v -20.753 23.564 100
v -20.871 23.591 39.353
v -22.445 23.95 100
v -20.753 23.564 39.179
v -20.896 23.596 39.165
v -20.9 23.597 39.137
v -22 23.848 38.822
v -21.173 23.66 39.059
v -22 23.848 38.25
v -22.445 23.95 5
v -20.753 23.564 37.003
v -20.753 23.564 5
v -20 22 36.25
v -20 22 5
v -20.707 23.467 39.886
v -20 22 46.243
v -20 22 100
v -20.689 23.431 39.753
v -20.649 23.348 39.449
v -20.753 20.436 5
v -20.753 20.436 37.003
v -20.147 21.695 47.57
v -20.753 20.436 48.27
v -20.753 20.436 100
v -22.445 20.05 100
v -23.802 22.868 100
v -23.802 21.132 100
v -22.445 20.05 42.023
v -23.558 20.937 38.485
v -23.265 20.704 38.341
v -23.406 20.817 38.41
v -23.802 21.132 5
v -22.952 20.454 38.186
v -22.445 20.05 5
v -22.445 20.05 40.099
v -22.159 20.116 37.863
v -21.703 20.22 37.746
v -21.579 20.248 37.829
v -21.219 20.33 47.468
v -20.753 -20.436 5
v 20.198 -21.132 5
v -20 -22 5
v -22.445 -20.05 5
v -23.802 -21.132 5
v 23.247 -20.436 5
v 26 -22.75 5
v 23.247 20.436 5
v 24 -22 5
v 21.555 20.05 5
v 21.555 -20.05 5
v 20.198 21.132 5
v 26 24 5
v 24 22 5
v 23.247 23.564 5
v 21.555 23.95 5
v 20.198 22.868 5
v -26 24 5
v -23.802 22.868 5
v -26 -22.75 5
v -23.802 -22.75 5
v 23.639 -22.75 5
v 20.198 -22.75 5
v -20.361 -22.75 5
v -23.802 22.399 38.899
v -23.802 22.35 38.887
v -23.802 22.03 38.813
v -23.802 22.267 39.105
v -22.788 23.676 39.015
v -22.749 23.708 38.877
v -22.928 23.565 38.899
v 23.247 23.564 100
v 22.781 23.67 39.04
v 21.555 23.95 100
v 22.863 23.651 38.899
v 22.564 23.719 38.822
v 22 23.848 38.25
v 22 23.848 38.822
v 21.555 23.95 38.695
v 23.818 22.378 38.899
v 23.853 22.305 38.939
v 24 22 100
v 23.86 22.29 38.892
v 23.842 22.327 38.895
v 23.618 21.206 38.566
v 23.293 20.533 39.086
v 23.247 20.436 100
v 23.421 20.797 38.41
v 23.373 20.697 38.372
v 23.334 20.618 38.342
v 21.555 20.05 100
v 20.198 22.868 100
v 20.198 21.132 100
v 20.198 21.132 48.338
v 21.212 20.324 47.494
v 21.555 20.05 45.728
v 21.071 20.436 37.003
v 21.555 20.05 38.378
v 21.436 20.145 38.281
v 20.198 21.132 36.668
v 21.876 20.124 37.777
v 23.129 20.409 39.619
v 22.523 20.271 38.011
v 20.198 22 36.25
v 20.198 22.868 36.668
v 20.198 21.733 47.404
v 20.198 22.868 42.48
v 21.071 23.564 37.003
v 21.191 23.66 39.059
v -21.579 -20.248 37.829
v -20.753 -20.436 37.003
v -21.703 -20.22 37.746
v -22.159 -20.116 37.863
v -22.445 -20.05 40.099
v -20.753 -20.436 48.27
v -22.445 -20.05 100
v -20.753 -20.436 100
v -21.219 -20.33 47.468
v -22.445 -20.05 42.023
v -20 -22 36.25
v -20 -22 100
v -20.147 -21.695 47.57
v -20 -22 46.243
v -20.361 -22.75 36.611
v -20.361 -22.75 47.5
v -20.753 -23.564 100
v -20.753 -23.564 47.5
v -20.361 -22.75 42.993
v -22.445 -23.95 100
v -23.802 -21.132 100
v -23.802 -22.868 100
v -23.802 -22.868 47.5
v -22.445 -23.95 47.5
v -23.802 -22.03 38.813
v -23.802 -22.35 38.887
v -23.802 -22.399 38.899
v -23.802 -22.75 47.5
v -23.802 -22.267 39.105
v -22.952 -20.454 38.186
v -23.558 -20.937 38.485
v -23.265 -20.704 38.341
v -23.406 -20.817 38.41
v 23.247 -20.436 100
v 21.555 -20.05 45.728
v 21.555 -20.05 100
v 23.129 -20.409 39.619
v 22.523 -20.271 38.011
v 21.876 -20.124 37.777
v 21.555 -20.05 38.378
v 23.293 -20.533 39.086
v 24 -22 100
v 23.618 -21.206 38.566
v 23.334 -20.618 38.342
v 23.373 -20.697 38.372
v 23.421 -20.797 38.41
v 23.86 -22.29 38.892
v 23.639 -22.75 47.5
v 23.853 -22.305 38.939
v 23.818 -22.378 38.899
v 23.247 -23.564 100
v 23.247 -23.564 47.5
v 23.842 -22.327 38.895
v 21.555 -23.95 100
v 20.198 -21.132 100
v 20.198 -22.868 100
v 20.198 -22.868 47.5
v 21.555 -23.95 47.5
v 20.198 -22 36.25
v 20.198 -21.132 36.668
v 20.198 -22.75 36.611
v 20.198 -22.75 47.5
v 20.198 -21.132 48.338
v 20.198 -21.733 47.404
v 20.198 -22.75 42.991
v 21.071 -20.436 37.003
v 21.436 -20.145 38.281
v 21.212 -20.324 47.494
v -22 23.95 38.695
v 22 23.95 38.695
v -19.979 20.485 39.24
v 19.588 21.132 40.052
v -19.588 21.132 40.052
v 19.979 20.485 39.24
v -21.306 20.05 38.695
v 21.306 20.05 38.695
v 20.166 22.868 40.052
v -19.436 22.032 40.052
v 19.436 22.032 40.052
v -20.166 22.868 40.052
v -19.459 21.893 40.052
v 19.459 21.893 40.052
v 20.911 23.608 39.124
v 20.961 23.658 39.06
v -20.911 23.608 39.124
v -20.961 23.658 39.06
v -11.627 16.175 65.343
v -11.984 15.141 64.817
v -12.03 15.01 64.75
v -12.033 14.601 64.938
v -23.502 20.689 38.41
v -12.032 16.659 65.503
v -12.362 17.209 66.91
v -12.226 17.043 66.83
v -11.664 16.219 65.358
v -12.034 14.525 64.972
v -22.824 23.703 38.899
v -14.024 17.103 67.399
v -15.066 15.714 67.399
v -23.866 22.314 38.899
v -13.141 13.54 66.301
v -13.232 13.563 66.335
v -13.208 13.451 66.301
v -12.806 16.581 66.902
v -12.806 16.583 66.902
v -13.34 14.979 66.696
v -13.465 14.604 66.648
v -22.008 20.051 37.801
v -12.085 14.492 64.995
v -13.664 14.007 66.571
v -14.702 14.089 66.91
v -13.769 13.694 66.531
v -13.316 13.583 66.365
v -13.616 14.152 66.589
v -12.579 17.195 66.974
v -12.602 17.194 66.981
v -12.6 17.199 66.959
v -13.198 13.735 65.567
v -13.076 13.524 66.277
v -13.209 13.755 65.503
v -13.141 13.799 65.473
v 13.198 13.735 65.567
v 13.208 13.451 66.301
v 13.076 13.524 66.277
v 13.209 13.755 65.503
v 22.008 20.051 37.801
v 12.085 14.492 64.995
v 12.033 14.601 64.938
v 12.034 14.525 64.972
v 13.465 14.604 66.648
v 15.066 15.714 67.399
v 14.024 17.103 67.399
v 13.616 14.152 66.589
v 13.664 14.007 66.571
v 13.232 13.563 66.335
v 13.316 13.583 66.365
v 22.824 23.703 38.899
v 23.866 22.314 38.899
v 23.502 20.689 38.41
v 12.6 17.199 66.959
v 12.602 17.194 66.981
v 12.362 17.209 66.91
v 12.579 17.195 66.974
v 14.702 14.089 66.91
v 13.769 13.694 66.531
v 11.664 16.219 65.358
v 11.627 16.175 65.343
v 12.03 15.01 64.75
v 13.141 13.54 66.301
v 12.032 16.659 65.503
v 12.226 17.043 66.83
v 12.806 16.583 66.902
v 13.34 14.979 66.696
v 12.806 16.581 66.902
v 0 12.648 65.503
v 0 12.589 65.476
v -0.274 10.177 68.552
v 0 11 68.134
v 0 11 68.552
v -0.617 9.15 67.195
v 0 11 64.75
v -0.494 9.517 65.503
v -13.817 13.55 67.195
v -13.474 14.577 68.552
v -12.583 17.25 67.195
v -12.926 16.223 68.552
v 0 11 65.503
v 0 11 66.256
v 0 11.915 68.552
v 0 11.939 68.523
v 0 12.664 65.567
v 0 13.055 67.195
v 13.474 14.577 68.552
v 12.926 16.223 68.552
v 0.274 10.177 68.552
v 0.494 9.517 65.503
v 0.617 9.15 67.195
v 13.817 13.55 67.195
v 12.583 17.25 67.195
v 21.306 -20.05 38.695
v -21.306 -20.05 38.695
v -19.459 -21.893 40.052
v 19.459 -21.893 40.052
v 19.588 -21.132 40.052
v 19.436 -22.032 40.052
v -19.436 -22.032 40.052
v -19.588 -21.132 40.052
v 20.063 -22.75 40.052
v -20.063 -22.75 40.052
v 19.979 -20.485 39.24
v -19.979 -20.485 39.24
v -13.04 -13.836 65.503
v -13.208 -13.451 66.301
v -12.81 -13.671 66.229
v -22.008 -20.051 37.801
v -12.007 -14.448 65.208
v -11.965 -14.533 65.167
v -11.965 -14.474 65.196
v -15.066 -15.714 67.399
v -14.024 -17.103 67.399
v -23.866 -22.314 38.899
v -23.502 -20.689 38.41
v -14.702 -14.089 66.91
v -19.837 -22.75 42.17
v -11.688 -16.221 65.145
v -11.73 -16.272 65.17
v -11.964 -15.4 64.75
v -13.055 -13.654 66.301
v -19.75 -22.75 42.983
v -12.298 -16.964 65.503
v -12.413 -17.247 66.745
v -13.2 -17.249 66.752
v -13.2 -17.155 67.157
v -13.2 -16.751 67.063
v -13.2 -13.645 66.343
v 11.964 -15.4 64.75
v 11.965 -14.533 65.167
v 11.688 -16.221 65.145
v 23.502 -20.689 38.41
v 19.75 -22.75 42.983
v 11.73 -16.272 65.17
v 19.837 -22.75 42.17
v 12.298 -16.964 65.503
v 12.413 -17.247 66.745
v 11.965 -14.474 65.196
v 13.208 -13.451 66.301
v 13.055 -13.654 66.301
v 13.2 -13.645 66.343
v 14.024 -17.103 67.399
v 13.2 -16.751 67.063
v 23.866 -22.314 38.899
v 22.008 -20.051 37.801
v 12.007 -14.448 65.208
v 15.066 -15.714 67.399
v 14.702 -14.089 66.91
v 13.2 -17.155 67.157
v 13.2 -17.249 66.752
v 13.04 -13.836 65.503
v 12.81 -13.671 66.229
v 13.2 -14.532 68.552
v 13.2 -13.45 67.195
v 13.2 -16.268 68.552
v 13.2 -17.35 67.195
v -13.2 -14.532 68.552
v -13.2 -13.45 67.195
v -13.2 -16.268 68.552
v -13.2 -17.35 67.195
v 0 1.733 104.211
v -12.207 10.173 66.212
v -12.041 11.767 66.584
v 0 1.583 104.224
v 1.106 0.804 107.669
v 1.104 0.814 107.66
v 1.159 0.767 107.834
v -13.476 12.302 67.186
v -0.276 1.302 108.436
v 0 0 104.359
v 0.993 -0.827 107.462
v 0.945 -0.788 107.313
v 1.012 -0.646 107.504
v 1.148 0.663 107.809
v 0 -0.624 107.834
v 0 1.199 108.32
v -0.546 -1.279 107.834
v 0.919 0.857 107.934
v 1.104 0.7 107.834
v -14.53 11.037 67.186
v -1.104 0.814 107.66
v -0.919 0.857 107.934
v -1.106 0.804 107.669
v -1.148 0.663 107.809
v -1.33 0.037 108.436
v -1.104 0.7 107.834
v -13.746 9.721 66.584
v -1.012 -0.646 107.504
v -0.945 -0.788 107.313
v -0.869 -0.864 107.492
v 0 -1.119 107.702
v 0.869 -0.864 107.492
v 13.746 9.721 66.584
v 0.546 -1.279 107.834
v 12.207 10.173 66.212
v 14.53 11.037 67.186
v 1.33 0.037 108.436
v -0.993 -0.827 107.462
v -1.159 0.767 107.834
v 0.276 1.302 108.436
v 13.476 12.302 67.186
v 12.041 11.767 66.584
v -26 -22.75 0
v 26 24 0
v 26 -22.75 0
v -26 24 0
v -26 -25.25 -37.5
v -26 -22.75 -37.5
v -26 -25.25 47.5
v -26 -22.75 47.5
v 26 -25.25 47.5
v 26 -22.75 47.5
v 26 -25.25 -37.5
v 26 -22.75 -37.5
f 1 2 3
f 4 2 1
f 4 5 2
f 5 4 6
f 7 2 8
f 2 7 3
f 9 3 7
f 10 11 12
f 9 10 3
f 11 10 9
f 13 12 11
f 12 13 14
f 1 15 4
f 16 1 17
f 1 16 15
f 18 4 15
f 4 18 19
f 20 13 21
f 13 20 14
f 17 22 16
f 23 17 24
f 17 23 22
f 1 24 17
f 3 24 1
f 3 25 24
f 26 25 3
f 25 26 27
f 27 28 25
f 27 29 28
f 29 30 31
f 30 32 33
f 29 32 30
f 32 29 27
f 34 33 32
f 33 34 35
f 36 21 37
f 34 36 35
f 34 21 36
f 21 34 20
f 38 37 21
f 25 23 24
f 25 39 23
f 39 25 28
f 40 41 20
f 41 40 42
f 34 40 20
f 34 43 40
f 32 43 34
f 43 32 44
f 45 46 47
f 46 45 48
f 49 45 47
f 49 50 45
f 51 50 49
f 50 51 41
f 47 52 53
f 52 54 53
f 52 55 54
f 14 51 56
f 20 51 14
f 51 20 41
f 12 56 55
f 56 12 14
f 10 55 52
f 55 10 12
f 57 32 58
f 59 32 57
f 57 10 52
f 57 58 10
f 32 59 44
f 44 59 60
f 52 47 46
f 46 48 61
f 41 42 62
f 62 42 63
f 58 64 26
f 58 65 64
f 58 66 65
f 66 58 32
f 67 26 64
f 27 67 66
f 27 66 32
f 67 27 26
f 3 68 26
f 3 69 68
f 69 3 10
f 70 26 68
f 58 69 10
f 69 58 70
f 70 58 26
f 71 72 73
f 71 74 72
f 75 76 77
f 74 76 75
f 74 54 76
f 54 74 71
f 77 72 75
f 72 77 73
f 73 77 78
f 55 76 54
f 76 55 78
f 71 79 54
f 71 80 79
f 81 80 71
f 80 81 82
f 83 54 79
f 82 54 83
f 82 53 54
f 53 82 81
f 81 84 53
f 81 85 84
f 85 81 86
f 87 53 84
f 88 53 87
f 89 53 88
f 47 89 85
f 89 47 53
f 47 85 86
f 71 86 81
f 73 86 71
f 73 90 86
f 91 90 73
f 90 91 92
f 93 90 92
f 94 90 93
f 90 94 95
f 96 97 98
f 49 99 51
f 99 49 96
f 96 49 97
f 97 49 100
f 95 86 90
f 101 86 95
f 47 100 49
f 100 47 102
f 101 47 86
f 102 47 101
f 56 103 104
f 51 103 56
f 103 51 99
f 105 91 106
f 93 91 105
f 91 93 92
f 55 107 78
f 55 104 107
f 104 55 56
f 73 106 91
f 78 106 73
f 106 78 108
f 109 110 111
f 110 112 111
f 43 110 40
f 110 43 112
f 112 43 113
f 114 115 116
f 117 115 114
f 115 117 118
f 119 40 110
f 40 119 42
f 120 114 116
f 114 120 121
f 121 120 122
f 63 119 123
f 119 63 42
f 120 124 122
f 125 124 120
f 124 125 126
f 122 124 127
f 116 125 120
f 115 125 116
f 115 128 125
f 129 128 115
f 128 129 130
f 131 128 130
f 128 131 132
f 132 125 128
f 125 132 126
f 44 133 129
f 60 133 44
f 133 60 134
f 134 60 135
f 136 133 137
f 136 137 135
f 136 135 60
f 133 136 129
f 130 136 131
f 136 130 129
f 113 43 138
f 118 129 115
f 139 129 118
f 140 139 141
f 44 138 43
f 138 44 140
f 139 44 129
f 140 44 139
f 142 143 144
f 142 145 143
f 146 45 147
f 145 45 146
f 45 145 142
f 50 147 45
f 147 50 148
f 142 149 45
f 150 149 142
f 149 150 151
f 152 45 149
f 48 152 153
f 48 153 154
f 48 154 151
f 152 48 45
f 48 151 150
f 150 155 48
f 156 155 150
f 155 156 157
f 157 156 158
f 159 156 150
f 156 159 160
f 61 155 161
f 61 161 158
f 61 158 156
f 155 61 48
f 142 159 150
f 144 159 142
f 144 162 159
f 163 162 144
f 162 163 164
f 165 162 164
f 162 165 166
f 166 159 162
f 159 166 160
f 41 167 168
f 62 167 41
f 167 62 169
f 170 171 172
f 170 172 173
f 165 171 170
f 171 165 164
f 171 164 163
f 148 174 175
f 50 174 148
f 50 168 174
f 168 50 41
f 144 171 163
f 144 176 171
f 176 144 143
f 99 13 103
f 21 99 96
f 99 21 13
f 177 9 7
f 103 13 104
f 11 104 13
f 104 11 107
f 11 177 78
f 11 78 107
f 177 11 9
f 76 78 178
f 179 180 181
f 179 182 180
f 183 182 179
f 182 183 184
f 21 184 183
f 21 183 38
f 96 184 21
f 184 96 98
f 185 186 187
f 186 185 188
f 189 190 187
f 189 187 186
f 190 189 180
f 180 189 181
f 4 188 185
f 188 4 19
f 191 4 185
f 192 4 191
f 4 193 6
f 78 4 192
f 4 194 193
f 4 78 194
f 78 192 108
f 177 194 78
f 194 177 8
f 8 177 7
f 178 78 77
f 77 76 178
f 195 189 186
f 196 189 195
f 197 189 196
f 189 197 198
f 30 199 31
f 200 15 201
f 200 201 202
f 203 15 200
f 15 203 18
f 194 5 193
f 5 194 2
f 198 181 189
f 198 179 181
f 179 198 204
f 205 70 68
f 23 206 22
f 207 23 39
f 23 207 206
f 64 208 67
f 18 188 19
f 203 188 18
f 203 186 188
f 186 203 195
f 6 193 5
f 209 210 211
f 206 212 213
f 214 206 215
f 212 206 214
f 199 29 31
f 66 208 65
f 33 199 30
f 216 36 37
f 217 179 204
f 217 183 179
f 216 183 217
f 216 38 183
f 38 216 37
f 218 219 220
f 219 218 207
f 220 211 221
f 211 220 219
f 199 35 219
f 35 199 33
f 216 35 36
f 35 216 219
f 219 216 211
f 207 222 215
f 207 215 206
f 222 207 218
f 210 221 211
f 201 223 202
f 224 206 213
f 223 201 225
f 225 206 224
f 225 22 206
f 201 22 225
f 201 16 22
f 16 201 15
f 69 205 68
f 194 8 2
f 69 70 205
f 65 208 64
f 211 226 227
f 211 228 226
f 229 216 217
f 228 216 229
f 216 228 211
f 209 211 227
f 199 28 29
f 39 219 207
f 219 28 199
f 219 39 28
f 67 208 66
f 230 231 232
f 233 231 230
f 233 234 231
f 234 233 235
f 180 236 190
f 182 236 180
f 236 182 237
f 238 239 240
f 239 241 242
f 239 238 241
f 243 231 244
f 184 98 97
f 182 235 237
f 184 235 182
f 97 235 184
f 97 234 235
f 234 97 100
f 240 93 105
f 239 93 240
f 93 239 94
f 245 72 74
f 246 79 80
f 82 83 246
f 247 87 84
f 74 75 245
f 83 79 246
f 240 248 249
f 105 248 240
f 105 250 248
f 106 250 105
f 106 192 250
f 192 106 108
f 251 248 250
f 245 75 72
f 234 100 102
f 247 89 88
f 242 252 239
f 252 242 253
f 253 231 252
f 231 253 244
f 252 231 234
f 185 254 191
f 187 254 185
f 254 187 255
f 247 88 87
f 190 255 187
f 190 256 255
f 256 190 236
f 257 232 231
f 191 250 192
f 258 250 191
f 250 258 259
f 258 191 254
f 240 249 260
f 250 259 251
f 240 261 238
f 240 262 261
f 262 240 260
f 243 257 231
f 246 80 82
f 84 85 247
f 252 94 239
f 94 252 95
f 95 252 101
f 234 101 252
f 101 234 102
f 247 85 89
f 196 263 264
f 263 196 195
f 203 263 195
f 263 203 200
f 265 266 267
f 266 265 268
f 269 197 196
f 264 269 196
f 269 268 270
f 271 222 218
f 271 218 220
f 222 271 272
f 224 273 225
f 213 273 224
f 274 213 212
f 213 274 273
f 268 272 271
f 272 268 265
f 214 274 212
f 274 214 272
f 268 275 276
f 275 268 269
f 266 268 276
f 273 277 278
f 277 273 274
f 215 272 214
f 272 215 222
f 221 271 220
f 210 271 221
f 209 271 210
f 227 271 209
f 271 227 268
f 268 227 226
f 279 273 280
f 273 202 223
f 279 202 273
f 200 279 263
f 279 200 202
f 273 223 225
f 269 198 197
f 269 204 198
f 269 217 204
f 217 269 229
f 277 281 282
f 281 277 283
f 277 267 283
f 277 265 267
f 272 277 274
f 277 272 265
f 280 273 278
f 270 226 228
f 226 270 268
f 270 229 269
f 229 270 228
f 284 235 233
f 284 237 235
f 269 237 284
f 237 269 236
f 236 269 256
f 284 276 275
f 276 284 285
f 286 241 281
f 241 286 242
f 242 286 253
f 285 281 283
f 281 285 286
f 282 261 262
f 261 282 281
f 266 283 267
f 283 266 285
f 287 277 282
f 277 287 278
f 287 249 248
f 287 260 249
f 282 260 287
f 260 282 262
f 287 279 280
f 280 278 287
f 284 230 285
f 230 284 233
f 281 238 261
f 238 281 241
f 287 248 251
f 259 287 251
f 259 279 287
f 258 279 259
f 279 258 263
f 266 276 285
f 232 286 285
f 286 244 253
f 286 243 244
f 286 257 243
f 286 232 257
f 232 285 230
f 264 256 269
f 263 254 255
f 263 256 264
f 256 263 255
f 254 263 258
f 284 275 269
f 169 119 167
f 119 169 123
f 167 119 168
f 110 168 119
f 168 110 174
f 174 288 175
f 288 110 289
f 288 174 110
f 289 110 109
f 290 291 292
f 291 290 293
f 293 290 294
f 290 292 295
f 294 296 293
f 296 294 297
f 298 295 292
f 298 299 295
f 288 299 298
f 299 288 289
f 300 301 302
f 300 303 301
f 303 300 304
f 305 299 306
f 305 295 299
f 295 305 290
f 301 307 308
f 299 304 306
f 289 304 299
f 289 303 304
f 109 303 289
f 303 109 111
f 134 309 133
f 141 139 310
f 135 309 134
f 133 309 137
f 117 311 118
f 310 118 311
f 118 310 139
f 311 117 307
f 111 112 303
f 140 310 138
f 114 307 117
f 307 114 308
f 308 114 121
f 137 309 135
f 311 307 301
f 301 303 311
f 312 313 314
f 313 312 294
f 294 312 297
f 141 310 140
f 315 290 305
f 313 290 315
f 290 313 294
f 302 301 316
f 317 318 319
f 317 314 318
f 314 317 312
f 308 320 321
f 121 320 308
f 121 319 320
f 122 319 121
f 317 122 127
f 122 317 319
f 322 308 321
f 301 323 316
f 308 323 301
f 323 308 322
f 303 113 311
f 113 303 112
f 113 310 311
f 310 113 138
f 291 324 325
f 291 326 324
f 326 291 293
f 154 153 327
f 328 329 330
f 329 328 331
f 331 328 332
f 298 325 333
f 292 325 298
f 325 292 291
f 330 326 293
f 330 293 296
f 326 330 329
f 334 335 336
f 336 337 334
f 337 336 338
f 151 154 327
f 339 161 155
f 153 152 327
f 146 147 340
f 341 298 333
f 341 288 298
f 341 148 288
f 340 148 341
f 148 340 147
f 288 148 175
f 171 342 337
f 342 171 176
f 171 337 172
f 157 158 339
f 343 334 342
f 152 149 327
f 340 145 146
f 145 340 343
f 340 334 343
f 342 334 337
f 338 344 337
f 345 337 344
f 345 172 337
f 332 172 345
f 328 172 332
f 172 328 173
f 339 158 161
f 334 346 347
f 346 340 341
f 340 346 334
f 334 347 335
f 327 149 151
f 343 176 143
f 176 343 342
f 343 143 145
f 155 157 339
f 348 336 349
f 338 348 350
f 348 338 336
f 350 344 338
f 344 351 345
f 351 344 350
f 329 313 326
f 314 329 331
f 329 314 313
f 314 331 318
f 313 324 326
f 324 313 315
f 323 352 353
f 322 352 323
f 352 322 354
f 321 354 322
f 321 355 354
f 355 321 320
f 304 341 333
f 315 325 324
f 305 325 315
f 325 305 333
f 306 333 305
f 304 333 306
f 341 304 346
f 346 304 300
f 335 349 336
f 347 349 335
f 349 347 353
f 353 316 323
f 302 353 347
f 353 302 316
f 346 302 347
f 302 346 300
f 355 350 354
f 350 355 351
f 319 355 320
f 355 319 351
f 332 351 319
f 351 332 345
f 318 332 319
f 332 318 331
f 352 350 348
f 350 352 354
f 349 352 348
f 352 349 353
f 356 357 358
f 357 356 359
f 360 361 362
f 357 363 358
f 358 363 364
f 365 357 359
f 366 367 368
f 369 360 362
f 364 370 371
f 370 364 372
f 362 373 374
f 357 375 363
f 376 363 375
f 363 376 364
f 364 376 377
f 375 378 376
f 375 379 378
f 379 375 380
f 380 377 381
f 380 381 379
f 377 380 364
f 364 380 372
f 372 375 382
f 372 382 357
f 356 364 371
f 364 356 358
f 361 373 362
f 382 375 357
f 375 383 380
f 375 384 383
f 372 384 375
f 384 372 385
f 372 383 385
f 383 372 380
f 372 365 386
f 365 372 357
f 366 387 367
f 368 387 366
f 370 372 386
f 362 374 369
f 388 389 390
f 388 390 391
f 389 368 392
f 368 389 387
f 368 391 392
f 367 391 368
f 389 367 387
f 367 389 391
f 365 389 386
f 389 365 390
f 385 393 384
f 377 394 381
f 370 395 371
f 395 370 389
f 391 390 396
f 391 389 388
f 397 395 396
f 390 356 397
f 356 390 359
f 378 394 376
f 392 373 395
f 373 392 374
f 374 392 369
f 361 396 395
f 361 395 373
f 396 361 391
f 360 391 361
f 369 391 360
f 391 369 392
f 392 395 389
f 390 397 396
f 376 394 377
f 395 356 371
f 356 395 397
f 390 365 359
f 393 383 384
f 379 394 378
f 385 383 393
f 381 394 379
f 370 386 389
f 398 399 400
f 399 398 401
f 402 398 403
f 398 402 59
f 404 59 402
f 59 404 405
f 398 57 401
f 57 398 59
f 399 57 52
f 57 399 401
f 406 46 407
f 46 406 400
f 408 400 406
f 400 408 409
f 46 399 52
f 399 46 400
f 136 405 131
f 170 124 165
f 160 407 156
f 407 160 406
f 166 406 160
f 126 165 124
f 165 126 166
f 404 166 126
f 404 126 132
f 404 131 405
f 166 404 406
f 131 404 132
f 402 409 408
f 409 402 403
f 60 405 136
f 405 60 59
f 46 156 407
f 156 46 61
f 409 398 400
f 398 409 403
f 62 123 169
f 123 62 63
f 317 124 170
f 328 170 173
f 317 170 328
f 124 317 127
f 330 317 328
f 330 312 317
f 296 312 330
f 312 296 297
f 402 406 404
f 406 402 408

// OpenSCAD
// Air Plant Holder - Geometric Cage Design
// Designed for leftmost air plant (~50-60mm tall, ~30-40mm wide)

// Dimensions
base_length = 52;    // mm
base_width = 48;     // mm
base_height = 5;     // mm

// Cage structure
cage_height = 95;    // mm - emphasizes plant height
cage_depth = 32;     // mm - approximate plant depth

// Back panel
back_thickness = 2.5; // mm
back_height = 85;    // mm

// Structural elements (strut/tube diameter)
strut_radius = 2;    // mm

// Main base - flat rectangular platform
module base() {
    linear_extrude(height = base_height) {
        square([base_length, base_width], center = true);
    }
}

// Back panel - solid rectangular support
module back_panel() {
    translate([0, -base_width/2, base_height])
        cube([base_length, back_thickness, back_height], center = true);
}

// Vertical edge struts (the 4 corners of the cage)
module vertical_struts() {
    fl_x = -base_length/2 + 4;
    fr_x = base_length/2 - 4;
    f_y = base_width/2 - 2;
    b_y = -base_width/2 + 2;

    // Front left strut
    translate([fl_x, f_y, base_height])
        cylinder(h = cage_height, r = strut_radius, center = false);

    // Front right strut
    translate([fr_x, f_y, base_height])
        cylinder(h = cage_height, r = strut_radius, center = false);

    // Back left strut
    translate([fl_x, b_y, base_height])
        cylinder(h = cage_height, r = strut_radius, center = false);

    // Back right strut
    translate([fr_x, b_y, base_height])
        cylinder(h = cage_height, r = strut_radius, center = false);
}

// Helper function to draw cylinders between two points
module strut_between(p1, p2, radius) {
    translate(p1)
        rotate([0, atan2(sqrt(pow(p2[0]-p1[0], 2) + pow(p2[1]-p1[1], 2)), p2[2]-p1[2]), atan2(p2[1]-p1[1], p2[0]-p1[0])])
            cylinder(h = sqrt(pow(p2[0]-p1[0], 2) + pow(p2[1]-p1[1], 2) + pow(p2[2]-p1[2], 2)), r = radius, center = false);
}

// Geometric frame - diamond/geometric shapes to create visual interest
module geometric_frame() {
    fl_x = -base_length/2 + 4;
    fr_x = base_length/2 - 4;
    f_y = base_width/2 - 2;
    b_y = -base_width/2 + 2;

    // Base points (at base level + strut offset)
    fl_base = [fl_x, f_y, base_height];
    fr_base = [fr_x, f_y, base_height];
    bl_base = [fl_x, b_y, base_height];
    br_base = [fr_x, b_y, base_height];

    // Lower diamond points (40% up)
    h1 = base_height + cage_height * 0.35;
    fl_d1 = [fl_x, f_y, h1];
    fr_d1 = [fr_x, f_y, h1];
    f_center_d1 = [0, f_y, h1];

    // Lower back
    bl_d1 = [fl_x, b_y, h1];
    br_d1 = [fr_x, b_y, h1];

    // Upper diamond points (70% up)
    h2 = base_height + cage_height * 0.65;
    fl_d2 = [fl_x * 0.6, f_y * 0.7, h2];
    fr_d2 = [fr_x * 0.6, f_y * 0.7, h2];
    f_center_d2 = [0, f_y * 0.5, h2];

    bl_d2 = [fl_x * 0.6, b_y * 0.7, h2];
    br_d2 = [fr_x * 0.6, b_y * 0.7, h2];

    // Front face - lower diamond
    strut_between(fl_base, fl_d1, strut_radius);
    strut_between(fr_base, fr_d1, strut_radius);
    strut_between(fl_d1, f_center_d1, strut_radius);
    strut_between(fr_d1, f_center_d1, strut_radius);

    // Front face - upper diamond
    strut_between(fl_d1, fl_d2, strut_radius);
    strut_between(fr_d1, fr_d2, strut_radius);
    strut_between(fl_d2, f_center_d2, strut_radius);
    strut_between(fr_d2, f_center_d2, strut_radius);

    // Back stabilizing struts
    strut_between(bl_base, bl_d1, strut_radius);
    strut_between(br_base, br_d1, strut_radius);
    strut_between(bl_d1, br_d1, strut_radius);

    strut_between(bl_d1, bl_d2, strut_radius);
    strut_between(br_d1, br_d2, strut_radius);
    strut_between(bl_d2, br_d2, strut_radius);
}

// Top peak - geometric accent
module top_peak() {
    peak_base_h = base_height + cage_height;
    // Connect diagonals to a peak point
    peak_point = [0, 0, peak_base_h + 8];

    fl_x = -base_length/2 + 4;
    fr_x = base_length/2 - 4;

    h2 = base_height + cage_height * 0.65;
    fl_d2 = [fl_x * 0.6, (base_width/2 - 2) * 0.5, h2];
    fr_d2 = [fr_x * 0.6, (base_width/2 - 2) * 0.5, h2];

    strut_between(fl_d2, peak_point, strut_radius * 0.7);
    strut_between(fr_d2, peak_point, strut_radius * 0.7);
}

// Assembly
base();
back_panel();
vertical_struts();
geometric_frame();
top_peak();

// Optional: Uncomment below to add visualization sphere showing plant placement
// translate([0, 0, base_height + 30])
//     %sphere(r = 20, $fn = 30);
